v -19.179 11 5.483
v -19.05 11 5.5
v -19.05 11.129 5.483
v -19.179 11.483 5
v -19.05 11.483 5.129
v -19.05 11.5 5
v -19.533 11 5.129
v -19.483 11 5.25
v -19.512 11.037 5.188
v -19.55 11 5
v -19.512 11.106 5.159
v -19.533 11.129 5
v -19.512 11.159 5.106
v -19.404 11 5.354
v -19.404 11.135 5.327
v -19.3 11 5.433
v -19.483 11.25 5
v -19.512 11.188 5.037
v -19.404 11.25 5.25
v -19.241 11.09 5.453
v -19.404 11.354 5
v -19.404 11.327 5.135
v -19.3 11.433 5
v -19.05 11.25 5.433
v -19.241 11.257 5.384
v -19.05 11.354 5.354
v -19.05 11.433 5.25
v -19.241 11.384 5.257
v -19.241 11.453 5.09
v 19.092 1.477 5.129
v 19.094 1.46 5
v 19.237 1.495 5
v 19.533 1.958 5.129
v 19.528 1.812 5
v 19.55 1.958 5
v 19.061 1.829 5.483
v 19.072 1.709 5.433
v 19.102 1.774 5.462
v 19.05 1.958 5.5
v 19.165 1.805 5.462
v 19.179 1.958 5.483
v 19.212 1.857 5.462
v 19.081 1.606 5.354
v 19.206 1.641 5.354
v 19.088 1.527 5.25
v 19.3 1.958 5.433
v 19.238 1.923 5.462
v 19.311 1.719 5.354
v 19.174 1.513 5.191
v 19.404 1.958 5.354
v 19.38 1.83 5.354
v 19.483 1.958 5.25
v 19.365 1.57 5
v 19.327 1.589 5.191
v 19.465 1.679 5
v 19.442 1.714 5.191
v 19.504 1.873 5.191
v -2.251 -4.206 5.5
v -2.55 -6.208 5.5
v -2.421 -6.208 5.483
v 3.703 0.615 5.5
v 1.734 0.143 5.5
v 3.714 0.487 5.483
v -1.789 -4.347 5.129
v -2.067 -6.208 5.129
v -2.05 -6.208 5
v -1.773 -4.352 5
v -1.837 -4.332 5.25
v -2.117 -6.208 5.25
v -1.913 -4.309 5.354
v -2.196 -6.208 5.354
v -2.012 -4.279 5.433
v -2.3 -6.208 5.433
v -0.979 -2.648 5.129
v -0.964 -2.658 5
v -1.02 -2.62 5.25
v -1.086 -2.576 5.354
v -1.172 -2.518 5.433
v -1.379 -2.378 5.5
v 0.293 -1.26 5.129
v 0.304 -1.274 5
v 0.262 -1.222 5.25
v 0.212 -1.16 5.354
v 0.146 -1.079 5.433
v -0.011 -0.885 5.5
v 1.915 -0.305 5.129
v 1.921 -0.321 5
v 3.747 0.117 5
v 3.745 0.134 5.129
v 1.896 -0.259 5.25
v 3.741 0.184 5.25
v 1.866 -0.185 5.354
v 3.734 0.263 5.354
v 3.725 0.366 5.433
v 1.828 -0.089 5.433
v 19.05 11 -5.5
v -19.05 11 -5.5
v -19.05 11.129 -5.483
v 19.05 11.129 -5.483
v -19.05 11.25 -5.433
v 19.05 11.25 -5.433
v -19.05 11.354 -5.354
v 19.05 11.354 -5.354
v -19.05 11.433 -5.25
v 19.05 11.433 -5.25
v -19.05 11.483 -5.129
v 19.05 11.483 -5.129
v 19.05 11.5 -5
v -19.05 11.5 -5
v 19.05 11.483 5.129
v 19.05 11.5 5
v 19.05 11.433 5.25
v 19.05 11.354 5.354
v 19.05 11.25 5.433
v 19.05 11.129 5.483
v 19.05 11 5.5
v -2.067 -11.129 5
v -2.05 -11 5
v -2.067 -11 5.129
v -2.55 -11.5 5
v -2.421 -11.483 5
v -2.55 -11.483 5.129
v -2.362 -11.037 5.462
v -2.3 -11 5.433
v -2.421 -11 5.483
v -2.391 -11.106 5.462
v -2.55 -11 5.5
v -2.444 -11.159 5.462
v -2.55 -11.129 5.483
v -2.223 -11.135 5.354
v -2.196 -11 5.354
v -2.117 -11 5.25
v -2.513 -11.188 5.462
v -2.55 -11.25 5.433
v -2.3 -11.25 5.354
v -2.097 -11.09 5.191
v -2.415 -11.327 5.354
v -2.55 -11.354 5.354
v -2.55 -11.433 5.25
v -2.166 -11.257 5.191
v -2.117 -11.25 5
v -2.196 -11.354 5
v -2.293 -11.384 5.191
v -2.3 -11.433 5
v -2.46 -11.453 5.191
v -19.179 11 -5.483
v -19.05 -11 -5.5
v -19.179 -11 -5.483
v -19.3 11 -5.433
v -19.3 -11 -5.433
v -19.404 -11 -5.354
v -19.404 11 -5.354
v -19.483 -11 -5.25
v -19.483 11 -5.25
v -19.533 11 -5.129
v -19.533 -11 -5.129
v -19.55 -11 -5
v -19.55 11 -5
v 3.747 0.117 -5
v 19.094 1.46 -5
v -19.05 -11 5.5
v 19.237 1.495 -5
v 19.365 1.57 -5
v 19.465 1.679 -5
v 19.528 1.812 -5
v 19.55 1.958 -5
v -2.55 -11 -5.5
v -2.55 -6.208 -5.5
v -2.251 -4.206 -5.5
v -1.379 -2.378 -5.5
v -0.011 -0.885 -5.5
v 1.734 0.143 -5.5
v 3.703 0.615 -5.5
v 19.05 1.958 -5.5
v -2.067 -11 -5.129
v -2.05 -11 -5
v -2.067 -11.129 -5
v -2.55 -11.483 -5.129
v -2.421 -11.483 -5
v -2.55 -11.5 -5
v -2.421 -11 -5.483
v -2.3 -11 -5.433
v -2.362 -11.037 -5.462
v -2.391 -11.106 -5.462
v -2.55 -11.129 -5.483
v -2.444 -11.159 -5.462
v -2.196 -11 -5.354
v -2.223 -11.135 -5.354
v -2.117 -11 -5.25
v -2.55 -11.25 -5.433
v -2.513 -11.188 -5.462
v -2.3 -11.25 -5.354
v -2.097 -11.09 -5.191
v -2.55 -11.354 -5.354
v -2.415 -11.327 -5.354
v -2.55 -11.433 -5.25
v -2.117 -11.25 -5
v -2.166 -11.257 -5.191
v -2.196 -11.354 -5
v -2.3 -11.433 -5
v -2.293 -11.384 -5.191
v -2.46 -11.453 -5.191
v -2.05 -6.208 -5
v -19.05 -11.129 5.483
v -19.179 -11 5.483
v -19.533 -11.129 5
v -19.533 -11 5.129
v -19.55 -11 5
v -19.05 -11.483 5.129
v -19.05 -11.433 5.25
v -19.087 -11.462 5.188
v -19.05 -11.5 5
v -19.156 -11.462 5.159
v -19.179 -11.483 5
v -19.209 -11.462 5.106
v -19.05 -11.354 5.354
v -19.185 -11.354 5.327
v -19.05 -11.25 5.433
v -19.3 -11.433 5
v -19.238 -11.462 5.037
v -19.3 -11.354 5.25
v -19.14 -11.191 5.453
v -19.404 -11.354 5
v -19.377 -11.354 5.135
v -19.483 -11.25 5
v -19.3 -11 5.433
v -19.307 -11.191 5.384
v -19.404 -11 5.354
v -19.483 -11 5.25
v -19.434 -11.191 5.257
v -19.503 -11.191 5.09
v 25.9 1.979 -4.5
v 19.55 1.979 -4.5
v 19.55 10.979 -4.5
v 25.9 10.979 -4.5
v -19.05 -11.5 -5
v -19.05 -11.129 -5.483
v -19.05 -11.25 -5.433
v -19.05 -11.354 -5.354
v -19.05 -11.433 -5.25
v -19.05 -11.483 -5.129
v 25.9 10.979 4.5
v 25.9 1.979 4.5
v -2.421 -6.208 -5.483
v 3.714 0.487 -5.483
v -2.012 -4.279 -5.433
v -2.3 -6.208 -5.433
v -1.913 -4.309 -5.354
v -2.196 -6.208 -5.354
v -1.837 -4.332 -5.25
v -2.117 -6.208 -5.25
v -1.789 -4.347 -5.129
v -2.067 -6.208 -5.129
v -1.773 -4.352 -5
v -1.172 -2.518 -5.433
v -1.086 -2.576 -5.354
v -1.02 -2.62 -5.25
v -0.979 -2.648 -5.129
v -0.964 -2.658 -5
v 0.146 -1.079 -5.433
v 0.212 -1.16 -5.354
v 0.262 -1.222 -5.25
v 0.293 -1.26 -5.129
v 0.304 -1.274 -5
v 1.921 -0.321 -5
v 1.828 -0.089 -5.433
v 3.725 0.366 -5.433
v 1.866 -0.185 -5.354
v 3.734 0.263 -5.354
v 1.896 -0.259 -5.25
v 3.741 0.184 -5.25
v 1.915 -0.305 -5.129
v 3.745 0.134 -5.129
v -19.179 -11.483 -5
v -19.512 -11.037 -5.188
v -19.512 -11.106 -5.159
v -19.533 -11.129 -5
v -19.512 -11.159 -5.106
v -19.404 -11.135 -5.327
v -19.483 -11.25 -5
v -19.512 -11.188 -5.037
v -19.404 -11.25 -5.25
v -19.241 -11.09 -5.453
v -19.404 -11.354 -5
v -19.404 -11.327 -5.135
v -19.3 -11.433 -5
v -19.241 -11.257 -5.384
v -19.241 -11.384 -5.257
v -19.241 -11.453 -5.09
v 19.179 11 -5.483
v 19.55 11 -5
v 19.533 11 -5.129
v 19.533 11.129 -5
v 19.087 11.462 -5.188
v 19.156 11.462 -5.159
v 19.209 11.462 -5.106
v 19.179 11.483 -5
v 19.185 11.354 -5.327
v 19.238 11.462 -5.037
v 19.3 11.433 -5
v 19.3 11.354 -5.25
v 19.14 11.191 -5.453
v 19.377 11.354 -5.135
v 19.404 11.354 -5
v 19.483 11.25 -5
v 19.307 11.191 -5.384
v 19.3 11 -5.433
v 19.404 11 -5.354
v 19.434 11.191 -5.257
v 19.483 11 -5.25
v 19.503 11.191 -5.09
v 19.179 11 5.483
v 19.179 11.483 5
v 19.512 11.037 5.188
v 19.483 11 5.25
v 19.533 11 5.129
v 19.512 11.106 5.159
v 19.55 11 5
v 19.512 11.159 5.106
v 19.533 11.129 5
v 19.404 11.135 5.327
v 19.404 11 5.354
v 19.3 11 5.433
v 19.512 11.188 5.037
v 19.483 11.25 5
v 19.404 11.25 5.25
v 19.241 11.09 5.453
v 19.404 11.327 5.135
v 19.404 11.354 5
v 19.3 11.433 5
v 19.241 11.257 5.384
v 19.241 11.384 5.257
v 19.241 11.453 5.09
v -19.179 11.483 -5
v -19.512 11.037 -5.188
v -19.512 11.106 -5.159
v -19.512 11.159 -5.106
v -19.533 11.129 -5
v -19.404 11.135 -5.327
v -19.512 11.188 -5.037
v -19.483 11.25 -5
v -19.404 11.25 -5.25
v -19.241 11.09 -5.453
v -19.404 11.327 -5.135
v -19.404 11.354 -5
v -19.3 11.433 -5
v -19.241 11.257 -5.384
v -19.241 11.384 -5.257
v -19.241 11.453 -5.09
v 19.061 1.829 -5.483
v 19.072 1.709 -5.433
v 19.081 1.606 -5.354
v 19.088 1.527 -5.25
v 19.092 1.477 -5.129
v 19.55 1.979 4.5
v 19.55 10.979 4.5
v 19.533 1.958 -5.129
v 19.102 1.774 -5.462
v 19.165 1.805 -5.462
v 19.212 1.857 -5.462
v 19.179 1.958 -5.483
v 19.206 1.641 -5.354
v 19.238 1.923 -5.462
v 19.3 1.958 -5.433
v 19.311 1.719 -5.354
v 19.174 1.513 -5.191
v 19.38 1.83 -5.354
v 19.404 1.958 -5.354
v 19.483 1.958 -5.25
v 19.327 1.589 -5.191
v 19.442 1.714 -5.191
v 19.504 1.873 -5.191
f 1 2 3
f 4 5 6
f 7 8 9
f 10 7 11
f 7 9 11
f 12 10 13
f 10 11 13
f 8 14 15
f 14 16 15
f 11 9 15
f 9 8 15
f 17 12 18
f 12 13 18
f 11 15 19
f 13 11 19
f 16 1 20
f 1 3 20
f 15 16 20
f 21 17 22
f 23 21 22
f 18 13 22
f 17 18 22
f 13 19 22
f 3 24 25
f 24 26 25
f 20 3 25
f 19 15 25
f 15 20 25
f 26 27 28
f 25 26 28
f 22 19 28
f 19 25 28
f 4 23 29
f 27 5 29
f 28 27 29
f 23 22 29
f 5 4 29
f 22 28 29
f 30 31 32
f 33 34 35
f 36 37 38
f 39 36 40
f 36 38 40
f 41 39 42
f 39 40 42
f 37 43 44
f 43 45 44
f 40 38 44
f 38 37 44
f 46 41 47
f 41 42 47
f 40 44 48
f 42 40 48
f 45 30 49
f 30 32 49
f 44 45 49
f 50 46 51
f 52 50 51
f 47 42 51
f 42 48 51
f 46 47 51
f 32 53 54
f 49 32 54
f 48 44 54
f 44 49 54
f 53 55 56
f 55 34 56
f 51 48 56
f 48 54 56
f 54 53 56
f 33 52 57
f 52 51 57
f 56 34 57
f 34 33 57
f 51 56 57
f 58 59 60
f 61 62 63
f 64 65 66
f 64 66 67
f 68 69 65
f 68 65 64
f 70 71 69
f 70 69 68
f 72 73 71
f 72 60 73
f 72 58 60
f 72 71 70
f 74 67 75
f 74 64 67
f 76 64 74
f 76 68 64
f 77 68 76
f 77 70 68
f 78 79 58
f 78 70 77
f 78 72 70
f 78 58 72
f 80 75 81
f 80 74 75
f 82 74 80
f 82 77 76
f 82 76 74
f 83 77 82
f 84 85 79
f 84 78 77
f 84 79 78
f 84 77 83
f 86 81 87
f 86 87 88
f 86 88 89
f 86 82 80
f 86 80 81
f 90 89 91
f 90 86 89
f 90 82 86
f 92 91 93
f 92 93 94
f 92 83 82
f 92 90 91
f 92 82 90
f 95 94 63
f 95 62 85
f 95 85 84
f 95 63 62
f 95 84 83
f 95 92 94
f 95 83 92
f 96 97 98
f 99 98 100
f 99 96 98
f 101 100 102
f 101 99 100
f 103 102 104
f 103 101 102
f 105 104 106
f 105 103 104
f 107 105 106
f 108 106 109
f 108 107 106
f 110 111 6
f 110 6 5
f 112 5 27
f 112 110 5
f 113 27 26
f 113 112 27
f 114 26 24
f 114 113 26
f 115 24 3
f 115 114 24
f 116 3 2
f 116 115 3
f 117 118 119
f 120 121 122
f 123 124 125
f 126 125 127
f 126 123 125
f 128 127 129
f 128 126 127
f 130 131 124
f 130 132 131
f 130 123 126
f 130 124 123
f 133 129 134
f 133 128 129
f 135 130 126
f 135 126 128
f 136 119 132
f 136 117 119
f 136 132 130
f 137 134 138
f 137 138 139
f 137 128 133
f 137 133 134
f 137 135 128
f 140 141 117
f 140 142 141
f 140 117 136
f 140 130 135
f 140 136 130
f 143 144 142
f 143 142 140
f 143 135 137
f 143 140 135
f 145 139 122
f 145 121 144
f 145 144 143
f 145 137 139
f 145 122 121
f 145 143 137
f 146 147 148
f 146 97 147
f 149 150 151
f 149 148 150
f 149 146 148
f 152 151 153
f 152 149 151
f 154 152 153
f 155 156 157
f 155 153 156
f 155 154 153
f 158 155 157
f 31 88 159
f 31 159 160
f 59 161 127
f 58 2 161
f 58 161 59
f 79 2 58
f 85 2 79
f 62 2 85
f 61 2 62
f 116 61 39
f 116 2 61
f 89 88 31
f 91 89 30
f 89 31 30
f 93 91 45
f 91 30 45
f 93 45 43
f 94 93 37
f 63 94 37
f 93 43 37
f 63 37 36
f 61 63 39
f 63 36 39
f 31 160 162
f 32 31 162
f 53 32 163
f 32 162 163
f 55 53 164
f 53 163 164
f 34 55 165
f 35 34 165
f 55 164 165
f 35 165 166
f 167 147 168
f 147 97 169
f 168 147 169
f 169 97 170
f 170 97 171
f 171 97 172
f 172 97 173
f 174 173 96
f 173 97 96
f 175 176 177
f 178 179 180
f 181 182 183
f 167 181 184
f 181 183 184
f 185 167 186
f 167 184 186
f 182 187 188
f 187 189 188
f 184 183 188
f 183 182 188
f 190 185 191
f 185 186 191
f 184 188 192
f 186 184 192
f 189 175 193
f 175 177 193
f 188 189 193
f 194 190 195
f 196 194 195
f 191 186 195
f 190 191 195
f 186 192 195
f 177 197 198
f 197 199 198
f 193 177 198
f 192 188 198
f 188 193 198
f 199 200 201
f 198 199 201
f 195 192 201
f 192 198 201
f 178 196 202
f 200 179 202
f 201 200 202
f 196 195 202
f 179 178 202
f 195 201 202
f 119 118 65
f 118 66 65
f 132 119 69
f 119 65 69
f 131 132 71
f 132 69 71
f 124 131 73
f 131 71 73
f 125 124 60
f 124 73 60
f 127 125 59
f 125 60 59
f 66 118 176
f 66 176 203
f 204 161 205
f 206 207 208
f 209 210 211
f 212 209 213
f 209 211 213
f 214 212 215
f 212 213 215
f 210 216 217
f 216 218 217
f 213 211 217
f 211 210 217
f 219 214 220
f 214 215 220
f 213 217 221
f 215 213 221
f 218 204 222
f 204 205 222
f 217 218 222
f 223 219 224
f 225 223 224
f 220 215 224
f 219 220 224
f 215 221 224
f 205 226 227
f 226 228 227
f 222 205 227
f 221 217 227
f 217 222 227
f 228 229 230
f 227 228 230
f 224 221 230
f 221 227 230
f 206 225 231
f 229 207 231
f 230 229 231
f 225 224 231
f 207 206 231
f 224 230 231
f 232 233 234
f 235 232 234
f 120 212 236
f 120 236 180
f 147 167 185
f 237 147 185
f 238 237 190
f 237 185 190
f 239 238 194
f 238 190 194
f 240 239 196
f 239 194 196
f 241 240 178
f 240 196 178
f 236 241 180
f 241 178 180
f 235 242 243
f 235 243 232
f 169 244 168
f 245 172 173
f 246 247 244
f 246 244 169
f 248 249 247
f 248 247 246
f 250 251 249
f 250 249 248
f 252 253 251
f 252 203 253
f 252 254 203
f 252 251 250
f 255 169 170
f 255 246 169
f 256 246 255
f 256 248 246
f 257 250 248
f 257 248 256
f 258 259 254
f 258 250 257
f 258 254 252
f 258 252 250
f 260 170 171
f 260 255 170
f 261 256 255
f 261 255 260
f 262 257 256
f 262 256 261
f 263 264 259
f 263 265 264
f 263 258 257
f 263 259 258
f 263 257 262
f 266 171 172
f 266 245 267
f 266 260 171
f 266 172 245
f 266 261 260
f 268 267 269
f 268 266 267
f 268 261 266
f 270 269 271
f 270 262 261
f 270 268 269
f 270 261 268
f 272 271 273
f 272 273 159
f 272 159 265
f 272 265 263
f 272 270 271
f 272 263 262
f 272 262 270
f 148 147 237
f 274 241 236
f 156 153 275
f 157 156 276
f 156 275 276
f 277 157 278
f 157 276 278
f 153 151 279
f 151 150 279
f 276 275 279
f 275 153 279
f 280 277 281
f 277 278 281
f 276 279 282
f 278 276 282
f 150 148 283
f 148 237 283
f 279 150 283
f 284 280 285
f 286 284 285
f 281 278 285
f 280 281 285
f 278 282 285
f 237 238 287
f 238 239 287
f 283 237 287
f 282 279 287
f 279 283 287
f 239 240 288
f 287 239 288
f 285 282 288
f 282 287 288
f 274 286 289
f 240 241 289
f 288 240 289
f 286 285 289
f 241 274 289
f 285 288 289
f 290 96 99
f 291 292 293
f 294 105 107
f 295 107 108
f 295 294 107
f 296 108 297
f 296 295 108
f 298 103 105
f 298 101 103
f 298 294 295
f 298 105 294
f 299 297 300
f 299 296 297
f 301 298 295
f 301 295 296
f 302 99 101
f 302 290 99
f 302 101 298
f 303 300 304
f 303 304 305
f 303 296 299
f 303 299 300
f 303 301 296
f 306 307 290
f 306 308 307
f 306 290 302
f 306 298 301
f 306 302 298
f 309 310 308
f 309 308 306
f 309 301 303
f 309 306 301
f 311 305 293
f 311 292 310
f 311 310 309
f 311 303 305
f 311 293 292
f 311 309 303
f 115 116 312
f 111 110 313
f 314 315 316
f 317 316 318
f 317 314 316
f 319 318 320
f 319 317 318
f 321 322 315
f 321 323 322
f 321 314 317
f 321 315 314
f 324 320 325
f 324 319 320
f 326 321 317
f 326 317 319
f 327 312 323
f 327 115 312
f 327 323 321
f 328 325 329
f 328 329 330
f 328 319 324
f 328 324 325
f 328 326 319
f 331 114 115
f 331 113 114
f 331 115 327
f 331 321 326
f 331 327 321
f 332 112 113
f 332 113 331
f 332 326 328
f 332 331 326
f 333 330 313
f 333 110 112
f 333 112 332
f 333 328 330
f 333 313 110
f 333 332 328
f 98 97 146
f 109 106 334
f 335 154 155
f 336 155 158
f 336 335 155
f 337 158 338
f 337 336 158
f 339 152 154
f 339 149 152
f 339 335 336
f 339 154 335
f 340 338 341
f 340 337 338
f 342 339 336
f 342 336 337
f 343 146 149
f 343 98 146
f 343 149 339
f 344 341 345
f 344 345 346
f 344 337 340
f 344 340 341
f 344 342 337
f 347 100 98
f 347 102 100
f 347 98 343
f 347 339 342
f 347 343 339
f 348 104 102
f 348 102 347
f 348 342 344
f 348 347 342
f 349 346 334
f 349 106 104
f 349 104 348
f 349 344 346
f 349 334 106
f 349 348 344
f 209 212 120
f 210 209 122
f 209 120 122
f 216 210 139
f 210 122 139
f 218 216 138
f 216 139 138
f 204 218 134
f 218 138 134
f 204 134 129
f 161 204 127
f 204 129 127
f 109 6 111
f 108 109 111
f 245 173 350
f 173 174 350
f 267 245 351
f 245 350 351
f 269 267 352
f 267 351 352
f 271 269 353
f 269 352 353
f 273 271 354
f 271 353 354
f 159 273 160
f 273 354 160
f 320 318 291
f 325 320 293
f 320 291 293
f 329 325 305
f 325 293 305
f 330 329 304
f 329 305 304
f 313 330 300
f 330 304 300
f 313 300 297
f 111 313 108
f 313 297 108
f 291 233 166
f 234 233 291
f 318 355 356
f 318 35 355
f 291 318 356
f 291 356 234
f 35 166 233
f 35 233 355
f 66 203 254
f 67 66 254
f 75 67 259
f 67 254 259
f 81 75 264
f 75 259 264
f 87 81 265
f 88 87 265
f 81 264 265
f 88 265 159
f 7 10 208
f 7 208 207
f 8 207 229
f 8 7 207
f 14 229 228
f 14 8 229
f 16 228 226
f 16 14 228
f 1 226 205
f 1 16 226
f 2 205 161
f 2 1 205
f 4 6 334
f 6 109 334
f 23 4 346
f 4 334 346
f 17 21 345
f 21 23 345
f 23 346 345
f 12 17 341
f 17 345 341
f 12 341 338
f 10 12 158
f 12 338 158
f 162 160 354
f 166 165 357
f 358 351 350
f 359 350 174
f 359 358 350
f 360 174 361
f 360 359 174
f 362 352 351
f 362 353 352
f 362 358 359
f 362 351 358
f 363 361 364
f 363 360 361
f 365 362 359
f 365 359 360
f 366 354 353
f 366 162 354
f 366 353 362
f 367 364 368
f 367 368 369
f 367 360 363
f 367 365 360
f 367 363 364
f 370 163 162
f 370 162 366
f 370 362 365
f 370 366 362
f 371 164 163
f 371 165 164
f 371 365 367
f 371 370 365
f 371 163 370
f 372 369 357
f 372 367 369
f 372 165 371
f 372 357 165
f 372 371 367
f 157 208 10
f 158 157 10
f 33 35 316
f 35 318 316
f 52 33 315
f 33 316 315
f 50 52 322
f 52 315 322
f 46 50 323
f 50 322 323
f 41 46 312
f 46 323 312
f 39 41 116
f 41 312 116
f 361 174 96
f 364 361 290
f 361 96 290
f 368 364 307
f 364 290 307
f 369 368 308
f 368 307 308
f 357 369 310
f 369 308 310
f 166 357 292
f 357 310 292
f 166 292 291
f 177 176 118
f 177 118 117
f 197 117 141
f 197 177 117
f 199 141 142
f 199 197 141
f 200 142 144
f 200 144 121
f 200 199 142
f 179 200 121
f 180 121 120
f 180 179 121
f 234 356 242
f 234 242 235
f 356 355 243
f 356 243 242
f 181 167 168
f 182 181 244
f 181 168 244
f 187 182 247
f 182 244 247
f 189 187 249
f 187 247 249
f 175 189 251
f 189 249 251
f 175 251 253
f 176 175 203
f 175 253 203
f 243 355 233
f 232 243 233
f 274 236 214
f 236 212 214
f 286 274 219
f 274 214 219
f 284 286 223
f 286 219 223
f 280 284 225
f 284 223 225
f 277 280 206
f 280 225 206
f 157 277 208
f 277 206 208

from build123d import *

# Parameters (mm, degrees)
SKETCH1_W           = 39.1
SKETCH1_H           = 23
BOSS_EXTRUDE1_DEPTH = 5.5
CUT_EXTRUDE1_DEPTH  = 26.208183195
FILLET1_R           = 6.35
FILLET2_R           = 0.5
SKETCH3_W           = 9
SKETCH3_H           = 9
BOSS_EXTRUDE2_DEPTH = 6.35


with BuildPart() as part:
    # Sketch1 → Boss-Extrude1 (new, symmetric)
    with BuildSketch(Plane.XY):
        Rectangle(SKETCH1_W, SKETCH1_H)
    extrude(amount=BOSS_EXTRUDE1_DEPTH, both=True)

    # Sketch2 → Cut-Extrude1 (cut, through all)
    with BuildSketch(Plane.XY.offset(5.5)):
        Polygon((19.55, -11.5), (-2.05, -11.5), (-2.05, -0.389755132), (19.55, 1.5), align=None)
    extrude(amount=-CUT_EXTRUDE1_DEPTH, mode=Mode.SUBTRACT)

    # Fillet1
    fillet1_edges = [part.edges().sort_by_distance(p)[0] for p in [
        (-2.05, -0.389755132, 0),
    ]]
    fillet(fillet1_edges, radius=FILLET1_R)

    # Fillet2
    fillet2_edges = [part.edges().sort_by_distance(p)[0] for p in [
        (0, 11.5, 5.5),
        (19.55, 6.5, -5.5),
        (19.55, 6.5, 5.5),
        (19.55, 1.5, 0),
        (-2.05, -11.5, 0),
        (11.648280517, 0.808689123, -5.5),
        (11.648280517, 0.808689123, 5.5),
        (-2.05, -8.854229044, 5.5),
        (-2.05, -8.854229044, -5.5),
        (-0.381711089, -1.918460269, 5.5),
        (-0.381711089, -1.918460269, -5.5),
        (-19.55, 0, 5.5),
        (0, 11.5, -5.5),
        (-10.8, -11.5, -5.5),
        (-19.55, 0, -5.5),
        (-10.8, -11.5, 5.5),
        (-19.55, 11.5, 0),
        (19.55, 11.5, 0),
        (-19.55, -11.5, 0),
    ]]
    fillet(fillet2_edges, radius=FILLET2_R)

    # Sketch3 → Boss-Extrude2 (add)
    with BuildSketch(Plane(origin=(19.55, 0, 0), x_dir=(0, 0, -1), z_dir=(1, 0, 0))):
        with Locations((0, 6.479082794)):
            Rectangle(SKETCH3_W, SKETCH3_H)
    extrude(amount=BOSS_EXTRUDE2_DEPTH)


solid = part.part
